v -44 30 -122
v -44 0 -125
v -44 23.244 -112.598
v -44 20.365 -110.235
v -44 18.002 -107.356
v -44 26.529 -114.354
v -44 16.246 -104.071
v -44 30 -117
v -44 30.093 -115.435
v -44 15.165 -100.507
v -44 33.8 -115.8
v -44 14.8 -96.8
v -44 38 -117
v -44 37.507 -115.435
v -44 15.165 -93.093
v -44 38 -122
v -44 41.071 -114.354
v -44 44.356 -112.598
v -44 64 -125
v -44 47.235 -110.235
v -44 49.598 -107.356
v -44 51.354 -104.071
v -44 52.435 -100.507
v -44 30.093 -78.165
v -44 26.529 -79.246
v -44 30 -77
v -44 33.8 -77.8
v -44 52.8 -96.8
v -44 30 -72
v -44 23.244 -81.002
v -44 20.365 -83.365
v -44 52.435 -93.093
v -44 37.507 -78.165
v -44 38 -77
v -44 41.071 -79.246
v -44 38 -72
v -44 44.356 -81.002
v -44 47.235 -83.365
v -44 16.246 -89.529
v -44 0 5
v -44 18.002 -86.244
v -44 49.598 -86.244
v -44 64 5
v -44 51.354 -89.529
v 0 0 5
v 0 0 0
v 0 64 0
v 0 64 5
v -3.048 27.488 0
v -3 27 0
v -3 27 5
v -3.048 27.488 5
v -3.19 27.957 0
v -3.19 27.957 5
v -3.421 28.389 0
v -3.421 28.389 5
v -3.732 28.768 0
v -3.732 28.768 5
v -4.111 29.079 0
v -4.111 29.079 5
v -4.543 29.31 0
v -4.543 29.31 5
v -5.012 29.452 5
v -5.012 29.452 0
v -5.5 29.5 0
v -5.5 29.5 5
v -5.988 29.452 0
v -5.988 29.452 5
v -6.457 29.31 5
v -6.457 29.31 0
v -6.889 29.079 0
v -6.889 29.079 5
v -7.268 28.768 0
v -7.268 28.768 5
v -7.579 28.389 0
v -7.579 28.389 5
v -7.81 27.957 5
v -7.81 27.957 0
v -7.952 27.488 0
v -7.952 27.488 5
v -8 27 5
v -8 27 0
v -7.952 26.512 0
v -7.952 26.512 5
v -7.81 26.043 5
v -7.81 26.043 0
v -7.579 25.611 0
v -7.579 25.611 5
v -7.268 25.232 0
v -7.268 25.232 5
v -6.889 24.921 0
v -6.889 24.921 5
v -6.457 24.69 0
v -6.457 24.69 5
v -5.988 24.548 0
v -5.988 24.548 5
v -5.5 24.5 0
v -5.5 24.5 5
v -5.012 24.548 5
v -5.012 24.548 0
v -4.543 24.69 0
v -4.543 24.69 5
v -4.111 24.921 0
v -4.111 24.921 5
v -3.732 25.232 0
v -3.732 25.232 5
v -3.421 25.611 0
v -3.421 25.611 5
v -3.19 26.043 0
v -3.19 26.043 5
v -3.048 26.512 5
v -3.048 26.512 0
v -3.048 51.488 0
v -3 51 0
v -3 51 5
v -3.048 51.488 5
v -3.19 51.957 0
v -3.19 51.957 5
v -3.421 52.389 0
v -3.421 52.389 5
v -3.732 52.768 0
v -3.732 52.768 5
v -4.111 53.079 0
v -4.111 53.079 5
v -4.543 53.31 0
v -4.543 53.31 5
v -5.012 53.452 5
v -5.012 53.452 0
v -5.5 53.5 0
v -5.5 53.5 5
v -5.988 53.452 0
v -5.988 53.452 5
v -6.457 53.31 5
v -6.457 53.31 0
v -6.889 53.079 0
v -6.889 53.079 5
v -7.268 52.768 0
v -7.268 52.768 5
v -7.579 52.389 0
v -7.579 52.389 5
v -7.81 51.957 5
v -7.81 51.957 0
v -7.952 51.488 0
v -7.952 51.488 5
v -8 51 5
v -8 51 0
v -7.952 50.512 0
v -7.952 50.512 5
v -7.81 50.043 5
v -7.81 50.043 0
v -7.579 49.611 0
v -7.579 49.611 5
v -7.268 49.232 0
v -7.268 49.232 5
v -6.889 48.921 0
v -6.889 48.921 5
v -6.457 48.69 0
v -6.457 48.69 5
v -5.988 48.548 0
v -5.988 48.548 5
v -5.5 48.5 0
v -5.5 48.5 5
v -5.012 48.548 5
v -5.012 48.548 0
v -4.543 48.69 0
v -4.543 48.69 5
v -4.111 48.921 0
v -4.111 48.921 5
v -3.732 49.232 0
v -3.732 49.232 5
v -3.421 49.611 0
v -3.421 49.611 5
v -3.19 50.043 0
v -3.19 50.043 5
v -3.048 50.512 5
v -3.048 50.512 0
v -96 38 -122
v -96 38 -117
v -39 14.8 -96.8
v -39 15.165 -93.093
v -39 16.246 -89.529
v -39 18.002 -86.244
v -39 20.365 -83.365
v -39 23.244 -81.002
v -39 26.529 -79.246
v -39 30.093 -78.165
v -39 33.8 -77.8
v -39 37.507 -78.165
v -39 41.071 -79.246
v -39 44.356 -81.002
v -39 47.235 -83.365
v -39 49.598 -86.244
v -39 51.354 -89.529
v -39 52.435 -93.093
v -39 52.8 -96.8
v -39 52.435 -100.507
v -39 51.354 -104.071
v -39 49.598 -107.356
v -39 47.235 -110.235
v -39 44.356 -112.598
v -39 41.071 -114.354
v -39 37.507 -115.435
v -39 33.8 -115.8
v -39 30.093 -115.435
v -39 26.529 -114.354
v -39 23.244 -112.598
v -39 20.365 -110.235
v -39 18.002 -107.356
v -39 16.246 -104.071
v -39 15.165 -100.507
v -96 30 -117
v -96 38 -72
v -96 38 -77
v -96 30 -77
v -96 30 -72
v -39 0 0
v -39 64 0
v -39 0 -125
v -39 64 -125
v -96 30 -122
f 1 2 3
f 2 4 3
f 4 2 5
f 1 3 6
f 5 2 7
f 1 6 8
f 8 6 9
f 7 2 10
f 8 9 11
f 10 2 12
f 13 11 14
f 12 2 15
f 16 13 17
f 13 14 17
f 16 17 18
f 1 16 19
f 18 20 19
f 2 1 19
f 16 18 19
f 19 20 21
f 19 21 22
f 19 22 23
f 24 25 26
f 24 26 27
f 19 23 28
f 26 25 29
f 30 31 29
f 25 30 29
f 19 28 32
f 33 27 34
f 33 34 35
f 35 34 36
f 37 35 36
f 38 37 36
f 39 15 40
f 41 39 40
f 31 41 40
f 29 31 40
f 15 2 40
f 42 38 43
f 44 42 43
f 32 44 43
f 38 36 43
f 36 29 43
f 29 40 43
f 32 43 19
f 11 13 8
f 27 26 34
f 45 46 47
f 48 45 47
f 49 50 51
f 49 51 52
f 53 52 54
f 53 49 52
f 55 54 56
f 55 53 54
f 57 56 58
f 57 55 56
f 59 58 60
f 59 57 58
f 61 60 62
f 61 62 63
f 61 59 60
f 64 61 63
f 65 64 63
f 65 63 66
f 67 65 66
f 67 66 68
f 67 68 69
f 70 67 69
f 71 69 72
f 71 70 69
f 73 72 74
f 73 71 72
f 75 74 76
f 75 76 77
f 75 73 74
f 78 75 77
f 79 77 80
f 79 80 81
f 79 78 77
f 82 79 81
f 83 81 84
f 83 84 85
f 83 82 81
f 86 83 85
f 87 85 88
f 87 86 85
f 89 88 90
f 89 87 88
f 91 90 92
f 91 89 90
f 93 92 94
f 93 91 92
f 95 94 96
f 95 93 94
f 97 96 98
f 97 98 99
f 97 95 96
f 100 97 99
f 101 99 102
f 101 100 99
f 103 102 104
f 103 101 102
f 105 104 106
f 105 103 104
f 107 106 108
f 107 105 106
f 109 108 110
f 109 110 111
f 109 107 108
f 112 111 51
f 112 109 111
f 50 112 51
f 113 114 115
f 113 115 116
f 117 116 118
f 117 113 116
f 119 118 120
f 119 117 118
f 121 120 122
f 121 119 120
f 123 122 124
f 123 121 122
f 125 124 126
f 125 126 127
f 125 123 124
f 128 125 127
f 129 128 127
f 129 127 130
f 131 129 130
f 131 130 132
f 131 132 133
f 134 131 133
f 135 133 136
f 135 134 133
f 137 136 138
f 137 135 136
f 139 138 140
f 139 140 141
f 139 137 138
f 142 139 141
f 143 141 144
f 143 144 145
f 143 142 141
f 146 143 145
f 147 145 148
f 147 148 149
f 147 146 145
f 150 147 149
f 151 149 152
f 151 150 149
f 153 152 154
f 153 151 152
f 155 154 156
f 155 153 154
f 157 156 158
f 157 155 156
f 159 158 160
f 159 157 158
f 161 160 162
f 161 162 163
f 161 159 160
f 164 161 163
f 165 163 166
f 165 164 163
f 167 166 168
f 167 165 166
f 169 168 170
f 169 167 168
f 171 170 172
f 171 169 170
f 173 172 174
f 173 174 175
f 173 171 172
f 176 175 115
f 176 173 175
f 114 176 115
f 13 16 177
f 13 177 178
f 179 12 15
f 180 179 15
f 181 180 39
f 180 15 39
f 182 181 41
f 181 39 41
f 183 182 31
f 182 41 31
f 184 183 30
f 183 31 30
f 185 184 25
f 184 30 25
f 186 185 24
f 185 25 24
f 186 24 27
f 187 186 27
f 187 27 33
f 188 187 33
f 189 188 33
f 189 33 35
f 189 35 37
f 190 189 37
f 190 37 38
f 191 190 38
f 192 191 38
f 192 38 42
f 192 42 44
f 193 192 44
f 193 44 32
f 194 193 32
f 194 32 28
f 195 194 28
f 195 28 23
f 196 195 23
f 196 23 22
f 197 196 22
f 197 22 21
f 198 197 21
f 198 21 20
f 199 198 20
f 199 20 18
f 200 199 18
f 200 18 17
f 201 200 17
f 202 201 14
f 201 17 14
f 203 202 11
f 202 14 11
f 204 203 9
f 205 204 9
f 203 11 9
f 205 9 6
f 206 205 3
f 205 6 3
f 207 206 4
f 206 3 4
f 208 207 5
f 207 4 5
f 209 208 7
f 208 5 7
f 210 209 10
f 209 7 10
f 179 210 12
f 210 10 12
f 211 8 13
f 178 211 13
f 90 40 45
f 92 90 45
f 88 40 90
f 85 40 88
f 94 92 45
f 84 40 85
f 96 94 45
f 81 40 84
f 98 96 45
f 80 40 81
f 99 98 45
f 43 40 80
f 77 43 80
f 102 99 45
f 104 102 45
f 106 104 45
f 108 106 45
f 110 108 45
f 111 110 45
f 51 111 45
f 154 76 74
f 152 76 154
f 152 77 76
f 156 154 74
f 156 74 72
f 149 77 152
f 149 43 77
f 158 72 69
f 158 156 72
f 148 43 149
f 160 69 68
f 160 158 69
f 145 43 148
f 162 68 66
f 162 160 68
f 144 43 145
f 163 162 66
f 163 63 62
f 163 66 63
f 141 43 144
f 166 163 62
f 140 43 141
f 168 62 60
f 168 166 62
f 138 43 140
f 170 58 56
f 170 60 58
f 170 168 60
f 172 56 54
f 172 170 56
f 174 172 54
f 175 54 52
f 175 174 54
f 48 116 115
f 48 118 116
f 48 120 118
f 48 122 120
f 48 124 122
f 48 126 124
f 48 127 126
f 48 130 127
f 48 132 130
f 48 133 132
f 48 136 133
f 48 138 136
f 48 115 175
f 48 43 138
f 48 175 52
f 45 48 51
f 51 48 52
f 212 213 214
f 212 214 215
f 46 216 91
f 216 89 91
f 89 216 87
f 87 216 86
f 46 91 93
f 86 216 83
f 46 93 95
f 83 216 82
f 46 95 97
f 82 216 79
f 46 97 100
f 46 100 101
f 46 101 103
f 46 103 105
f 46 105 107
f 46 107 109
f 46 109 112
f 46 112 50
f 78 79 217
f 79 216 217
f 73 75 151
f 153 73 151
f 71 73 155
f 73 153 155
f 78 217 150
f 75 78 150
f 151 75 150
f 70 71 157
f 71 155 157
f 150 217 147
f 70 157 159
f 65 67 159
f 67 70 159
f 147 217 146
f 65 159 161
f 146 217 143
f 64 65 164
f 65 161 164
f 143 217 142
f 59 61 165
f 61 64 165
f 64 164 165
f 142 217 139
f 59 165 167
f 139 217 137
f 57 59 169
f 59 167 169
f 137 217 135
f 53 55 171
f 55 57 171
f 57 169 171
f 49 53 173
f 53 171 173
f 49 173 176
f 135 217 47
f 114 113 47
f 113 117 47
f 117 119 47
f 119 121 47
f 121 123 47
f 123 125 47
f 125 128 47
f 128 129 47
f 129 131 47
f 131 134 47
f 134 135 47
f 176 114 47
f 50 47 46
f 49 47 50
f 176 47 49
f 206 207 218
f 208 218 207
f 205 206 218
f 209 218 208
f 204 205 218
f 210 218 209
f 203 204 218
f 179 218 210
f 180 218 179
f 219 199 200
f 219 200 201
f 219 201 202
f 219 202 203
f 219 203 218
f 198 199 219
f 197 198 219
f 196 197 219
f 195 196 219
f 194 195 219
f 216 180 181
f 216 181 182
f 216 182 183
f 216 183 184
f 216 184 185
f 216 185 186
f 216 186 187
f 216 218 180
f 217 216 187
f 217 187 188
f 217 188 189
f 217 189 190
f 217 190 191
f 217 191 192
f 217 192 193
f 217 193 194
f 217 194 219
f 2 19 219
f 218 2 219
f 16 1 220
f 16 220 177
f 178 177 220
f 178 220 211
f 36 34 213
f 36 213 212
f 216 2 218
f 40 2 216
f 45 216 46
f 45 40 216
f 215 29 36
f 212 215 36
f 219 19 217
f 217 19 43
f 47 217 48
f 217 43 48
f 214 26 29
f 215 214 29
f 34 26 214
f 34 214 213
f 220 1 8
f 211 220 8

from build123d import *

# Parameters (mm, degrees)
ESQUISSE1_W             = 39
ESQUISSE1_H             = 64
ESQUISSE1_R             = 2.5
BOSS_EXTRU_1_DEPTH      = 5
ESQUISSE2_W             = 5
ESQUISSE2_H             = 64
BOSS_EXTRU_2_DEPTH      = 130
ESQUISSE3_R             = 19
ENL_V_MAT_EXTRU_1_DEPTH = 148.163174742
ESQUISSE4_W             = 5
ESQUISSE4_H             = 8
BOSS_EXTRU_3_DEPTH      = 52


with BuildPart() as part:
    # Esquisse1 → Boss.-Extru.1 (new body)
    with BuildSketch(Plane.XY):
        with Locations((-19.5, 32)):
            Rectangle(ESQUISSE1_W, ESQUISSE1_H)
        with Locations((-5.5, 51)):
            Circle(ESQUISSE1_R, mode=Mode.SUBTRACT)
        with Locations((-5.5, 27)):
            Circle(ESQUISSE1_R, mode=Mode.SUBTRACT)
    extrude(amount=BOSS_EXTRU_1_DEPTH)

    # Esquisse2 → Boss.-Extru.2 (add)
    with BuildSketch(Plane.XY.offset(5)):
        with Locations((-41.5, 32)):
            Rectangle(ESQUISSE2_W, ESQUISSE2_H)
    extrude(amount=-BOSS_EXTRU_2_DEPTH)

    # Esquisse3 → Enlèv. mat.-Extru.1 (cut, through all)
    with BuildSketch(Plane.ZY.offset(44)):
        with Locations(Location((-96.8, 33.8, 0), (0, 0, 270))):
            Circle(ESQUISSE3_R)
    extrude(amount=-ENL_V_MAT_EXTRU_1_DEPTH, mode=Mode.SUBTRACT)

    # Esquisse4 → Boss.-Extru.3 (add)
    with BuildSketch(Plane.ZY.offset(44)):
        with Locations((-74.5, 34)):
            Rectangle(ESQUISSE4_W, ESQUISSE4_H)
        with Locations((-119.5, 34)):
            Rectangle(ESQUISSE4_W, ESQUISSE4_H)
    extrude(amount=BOSS_EXTRU_3_DEPTH)


solid = part.part
